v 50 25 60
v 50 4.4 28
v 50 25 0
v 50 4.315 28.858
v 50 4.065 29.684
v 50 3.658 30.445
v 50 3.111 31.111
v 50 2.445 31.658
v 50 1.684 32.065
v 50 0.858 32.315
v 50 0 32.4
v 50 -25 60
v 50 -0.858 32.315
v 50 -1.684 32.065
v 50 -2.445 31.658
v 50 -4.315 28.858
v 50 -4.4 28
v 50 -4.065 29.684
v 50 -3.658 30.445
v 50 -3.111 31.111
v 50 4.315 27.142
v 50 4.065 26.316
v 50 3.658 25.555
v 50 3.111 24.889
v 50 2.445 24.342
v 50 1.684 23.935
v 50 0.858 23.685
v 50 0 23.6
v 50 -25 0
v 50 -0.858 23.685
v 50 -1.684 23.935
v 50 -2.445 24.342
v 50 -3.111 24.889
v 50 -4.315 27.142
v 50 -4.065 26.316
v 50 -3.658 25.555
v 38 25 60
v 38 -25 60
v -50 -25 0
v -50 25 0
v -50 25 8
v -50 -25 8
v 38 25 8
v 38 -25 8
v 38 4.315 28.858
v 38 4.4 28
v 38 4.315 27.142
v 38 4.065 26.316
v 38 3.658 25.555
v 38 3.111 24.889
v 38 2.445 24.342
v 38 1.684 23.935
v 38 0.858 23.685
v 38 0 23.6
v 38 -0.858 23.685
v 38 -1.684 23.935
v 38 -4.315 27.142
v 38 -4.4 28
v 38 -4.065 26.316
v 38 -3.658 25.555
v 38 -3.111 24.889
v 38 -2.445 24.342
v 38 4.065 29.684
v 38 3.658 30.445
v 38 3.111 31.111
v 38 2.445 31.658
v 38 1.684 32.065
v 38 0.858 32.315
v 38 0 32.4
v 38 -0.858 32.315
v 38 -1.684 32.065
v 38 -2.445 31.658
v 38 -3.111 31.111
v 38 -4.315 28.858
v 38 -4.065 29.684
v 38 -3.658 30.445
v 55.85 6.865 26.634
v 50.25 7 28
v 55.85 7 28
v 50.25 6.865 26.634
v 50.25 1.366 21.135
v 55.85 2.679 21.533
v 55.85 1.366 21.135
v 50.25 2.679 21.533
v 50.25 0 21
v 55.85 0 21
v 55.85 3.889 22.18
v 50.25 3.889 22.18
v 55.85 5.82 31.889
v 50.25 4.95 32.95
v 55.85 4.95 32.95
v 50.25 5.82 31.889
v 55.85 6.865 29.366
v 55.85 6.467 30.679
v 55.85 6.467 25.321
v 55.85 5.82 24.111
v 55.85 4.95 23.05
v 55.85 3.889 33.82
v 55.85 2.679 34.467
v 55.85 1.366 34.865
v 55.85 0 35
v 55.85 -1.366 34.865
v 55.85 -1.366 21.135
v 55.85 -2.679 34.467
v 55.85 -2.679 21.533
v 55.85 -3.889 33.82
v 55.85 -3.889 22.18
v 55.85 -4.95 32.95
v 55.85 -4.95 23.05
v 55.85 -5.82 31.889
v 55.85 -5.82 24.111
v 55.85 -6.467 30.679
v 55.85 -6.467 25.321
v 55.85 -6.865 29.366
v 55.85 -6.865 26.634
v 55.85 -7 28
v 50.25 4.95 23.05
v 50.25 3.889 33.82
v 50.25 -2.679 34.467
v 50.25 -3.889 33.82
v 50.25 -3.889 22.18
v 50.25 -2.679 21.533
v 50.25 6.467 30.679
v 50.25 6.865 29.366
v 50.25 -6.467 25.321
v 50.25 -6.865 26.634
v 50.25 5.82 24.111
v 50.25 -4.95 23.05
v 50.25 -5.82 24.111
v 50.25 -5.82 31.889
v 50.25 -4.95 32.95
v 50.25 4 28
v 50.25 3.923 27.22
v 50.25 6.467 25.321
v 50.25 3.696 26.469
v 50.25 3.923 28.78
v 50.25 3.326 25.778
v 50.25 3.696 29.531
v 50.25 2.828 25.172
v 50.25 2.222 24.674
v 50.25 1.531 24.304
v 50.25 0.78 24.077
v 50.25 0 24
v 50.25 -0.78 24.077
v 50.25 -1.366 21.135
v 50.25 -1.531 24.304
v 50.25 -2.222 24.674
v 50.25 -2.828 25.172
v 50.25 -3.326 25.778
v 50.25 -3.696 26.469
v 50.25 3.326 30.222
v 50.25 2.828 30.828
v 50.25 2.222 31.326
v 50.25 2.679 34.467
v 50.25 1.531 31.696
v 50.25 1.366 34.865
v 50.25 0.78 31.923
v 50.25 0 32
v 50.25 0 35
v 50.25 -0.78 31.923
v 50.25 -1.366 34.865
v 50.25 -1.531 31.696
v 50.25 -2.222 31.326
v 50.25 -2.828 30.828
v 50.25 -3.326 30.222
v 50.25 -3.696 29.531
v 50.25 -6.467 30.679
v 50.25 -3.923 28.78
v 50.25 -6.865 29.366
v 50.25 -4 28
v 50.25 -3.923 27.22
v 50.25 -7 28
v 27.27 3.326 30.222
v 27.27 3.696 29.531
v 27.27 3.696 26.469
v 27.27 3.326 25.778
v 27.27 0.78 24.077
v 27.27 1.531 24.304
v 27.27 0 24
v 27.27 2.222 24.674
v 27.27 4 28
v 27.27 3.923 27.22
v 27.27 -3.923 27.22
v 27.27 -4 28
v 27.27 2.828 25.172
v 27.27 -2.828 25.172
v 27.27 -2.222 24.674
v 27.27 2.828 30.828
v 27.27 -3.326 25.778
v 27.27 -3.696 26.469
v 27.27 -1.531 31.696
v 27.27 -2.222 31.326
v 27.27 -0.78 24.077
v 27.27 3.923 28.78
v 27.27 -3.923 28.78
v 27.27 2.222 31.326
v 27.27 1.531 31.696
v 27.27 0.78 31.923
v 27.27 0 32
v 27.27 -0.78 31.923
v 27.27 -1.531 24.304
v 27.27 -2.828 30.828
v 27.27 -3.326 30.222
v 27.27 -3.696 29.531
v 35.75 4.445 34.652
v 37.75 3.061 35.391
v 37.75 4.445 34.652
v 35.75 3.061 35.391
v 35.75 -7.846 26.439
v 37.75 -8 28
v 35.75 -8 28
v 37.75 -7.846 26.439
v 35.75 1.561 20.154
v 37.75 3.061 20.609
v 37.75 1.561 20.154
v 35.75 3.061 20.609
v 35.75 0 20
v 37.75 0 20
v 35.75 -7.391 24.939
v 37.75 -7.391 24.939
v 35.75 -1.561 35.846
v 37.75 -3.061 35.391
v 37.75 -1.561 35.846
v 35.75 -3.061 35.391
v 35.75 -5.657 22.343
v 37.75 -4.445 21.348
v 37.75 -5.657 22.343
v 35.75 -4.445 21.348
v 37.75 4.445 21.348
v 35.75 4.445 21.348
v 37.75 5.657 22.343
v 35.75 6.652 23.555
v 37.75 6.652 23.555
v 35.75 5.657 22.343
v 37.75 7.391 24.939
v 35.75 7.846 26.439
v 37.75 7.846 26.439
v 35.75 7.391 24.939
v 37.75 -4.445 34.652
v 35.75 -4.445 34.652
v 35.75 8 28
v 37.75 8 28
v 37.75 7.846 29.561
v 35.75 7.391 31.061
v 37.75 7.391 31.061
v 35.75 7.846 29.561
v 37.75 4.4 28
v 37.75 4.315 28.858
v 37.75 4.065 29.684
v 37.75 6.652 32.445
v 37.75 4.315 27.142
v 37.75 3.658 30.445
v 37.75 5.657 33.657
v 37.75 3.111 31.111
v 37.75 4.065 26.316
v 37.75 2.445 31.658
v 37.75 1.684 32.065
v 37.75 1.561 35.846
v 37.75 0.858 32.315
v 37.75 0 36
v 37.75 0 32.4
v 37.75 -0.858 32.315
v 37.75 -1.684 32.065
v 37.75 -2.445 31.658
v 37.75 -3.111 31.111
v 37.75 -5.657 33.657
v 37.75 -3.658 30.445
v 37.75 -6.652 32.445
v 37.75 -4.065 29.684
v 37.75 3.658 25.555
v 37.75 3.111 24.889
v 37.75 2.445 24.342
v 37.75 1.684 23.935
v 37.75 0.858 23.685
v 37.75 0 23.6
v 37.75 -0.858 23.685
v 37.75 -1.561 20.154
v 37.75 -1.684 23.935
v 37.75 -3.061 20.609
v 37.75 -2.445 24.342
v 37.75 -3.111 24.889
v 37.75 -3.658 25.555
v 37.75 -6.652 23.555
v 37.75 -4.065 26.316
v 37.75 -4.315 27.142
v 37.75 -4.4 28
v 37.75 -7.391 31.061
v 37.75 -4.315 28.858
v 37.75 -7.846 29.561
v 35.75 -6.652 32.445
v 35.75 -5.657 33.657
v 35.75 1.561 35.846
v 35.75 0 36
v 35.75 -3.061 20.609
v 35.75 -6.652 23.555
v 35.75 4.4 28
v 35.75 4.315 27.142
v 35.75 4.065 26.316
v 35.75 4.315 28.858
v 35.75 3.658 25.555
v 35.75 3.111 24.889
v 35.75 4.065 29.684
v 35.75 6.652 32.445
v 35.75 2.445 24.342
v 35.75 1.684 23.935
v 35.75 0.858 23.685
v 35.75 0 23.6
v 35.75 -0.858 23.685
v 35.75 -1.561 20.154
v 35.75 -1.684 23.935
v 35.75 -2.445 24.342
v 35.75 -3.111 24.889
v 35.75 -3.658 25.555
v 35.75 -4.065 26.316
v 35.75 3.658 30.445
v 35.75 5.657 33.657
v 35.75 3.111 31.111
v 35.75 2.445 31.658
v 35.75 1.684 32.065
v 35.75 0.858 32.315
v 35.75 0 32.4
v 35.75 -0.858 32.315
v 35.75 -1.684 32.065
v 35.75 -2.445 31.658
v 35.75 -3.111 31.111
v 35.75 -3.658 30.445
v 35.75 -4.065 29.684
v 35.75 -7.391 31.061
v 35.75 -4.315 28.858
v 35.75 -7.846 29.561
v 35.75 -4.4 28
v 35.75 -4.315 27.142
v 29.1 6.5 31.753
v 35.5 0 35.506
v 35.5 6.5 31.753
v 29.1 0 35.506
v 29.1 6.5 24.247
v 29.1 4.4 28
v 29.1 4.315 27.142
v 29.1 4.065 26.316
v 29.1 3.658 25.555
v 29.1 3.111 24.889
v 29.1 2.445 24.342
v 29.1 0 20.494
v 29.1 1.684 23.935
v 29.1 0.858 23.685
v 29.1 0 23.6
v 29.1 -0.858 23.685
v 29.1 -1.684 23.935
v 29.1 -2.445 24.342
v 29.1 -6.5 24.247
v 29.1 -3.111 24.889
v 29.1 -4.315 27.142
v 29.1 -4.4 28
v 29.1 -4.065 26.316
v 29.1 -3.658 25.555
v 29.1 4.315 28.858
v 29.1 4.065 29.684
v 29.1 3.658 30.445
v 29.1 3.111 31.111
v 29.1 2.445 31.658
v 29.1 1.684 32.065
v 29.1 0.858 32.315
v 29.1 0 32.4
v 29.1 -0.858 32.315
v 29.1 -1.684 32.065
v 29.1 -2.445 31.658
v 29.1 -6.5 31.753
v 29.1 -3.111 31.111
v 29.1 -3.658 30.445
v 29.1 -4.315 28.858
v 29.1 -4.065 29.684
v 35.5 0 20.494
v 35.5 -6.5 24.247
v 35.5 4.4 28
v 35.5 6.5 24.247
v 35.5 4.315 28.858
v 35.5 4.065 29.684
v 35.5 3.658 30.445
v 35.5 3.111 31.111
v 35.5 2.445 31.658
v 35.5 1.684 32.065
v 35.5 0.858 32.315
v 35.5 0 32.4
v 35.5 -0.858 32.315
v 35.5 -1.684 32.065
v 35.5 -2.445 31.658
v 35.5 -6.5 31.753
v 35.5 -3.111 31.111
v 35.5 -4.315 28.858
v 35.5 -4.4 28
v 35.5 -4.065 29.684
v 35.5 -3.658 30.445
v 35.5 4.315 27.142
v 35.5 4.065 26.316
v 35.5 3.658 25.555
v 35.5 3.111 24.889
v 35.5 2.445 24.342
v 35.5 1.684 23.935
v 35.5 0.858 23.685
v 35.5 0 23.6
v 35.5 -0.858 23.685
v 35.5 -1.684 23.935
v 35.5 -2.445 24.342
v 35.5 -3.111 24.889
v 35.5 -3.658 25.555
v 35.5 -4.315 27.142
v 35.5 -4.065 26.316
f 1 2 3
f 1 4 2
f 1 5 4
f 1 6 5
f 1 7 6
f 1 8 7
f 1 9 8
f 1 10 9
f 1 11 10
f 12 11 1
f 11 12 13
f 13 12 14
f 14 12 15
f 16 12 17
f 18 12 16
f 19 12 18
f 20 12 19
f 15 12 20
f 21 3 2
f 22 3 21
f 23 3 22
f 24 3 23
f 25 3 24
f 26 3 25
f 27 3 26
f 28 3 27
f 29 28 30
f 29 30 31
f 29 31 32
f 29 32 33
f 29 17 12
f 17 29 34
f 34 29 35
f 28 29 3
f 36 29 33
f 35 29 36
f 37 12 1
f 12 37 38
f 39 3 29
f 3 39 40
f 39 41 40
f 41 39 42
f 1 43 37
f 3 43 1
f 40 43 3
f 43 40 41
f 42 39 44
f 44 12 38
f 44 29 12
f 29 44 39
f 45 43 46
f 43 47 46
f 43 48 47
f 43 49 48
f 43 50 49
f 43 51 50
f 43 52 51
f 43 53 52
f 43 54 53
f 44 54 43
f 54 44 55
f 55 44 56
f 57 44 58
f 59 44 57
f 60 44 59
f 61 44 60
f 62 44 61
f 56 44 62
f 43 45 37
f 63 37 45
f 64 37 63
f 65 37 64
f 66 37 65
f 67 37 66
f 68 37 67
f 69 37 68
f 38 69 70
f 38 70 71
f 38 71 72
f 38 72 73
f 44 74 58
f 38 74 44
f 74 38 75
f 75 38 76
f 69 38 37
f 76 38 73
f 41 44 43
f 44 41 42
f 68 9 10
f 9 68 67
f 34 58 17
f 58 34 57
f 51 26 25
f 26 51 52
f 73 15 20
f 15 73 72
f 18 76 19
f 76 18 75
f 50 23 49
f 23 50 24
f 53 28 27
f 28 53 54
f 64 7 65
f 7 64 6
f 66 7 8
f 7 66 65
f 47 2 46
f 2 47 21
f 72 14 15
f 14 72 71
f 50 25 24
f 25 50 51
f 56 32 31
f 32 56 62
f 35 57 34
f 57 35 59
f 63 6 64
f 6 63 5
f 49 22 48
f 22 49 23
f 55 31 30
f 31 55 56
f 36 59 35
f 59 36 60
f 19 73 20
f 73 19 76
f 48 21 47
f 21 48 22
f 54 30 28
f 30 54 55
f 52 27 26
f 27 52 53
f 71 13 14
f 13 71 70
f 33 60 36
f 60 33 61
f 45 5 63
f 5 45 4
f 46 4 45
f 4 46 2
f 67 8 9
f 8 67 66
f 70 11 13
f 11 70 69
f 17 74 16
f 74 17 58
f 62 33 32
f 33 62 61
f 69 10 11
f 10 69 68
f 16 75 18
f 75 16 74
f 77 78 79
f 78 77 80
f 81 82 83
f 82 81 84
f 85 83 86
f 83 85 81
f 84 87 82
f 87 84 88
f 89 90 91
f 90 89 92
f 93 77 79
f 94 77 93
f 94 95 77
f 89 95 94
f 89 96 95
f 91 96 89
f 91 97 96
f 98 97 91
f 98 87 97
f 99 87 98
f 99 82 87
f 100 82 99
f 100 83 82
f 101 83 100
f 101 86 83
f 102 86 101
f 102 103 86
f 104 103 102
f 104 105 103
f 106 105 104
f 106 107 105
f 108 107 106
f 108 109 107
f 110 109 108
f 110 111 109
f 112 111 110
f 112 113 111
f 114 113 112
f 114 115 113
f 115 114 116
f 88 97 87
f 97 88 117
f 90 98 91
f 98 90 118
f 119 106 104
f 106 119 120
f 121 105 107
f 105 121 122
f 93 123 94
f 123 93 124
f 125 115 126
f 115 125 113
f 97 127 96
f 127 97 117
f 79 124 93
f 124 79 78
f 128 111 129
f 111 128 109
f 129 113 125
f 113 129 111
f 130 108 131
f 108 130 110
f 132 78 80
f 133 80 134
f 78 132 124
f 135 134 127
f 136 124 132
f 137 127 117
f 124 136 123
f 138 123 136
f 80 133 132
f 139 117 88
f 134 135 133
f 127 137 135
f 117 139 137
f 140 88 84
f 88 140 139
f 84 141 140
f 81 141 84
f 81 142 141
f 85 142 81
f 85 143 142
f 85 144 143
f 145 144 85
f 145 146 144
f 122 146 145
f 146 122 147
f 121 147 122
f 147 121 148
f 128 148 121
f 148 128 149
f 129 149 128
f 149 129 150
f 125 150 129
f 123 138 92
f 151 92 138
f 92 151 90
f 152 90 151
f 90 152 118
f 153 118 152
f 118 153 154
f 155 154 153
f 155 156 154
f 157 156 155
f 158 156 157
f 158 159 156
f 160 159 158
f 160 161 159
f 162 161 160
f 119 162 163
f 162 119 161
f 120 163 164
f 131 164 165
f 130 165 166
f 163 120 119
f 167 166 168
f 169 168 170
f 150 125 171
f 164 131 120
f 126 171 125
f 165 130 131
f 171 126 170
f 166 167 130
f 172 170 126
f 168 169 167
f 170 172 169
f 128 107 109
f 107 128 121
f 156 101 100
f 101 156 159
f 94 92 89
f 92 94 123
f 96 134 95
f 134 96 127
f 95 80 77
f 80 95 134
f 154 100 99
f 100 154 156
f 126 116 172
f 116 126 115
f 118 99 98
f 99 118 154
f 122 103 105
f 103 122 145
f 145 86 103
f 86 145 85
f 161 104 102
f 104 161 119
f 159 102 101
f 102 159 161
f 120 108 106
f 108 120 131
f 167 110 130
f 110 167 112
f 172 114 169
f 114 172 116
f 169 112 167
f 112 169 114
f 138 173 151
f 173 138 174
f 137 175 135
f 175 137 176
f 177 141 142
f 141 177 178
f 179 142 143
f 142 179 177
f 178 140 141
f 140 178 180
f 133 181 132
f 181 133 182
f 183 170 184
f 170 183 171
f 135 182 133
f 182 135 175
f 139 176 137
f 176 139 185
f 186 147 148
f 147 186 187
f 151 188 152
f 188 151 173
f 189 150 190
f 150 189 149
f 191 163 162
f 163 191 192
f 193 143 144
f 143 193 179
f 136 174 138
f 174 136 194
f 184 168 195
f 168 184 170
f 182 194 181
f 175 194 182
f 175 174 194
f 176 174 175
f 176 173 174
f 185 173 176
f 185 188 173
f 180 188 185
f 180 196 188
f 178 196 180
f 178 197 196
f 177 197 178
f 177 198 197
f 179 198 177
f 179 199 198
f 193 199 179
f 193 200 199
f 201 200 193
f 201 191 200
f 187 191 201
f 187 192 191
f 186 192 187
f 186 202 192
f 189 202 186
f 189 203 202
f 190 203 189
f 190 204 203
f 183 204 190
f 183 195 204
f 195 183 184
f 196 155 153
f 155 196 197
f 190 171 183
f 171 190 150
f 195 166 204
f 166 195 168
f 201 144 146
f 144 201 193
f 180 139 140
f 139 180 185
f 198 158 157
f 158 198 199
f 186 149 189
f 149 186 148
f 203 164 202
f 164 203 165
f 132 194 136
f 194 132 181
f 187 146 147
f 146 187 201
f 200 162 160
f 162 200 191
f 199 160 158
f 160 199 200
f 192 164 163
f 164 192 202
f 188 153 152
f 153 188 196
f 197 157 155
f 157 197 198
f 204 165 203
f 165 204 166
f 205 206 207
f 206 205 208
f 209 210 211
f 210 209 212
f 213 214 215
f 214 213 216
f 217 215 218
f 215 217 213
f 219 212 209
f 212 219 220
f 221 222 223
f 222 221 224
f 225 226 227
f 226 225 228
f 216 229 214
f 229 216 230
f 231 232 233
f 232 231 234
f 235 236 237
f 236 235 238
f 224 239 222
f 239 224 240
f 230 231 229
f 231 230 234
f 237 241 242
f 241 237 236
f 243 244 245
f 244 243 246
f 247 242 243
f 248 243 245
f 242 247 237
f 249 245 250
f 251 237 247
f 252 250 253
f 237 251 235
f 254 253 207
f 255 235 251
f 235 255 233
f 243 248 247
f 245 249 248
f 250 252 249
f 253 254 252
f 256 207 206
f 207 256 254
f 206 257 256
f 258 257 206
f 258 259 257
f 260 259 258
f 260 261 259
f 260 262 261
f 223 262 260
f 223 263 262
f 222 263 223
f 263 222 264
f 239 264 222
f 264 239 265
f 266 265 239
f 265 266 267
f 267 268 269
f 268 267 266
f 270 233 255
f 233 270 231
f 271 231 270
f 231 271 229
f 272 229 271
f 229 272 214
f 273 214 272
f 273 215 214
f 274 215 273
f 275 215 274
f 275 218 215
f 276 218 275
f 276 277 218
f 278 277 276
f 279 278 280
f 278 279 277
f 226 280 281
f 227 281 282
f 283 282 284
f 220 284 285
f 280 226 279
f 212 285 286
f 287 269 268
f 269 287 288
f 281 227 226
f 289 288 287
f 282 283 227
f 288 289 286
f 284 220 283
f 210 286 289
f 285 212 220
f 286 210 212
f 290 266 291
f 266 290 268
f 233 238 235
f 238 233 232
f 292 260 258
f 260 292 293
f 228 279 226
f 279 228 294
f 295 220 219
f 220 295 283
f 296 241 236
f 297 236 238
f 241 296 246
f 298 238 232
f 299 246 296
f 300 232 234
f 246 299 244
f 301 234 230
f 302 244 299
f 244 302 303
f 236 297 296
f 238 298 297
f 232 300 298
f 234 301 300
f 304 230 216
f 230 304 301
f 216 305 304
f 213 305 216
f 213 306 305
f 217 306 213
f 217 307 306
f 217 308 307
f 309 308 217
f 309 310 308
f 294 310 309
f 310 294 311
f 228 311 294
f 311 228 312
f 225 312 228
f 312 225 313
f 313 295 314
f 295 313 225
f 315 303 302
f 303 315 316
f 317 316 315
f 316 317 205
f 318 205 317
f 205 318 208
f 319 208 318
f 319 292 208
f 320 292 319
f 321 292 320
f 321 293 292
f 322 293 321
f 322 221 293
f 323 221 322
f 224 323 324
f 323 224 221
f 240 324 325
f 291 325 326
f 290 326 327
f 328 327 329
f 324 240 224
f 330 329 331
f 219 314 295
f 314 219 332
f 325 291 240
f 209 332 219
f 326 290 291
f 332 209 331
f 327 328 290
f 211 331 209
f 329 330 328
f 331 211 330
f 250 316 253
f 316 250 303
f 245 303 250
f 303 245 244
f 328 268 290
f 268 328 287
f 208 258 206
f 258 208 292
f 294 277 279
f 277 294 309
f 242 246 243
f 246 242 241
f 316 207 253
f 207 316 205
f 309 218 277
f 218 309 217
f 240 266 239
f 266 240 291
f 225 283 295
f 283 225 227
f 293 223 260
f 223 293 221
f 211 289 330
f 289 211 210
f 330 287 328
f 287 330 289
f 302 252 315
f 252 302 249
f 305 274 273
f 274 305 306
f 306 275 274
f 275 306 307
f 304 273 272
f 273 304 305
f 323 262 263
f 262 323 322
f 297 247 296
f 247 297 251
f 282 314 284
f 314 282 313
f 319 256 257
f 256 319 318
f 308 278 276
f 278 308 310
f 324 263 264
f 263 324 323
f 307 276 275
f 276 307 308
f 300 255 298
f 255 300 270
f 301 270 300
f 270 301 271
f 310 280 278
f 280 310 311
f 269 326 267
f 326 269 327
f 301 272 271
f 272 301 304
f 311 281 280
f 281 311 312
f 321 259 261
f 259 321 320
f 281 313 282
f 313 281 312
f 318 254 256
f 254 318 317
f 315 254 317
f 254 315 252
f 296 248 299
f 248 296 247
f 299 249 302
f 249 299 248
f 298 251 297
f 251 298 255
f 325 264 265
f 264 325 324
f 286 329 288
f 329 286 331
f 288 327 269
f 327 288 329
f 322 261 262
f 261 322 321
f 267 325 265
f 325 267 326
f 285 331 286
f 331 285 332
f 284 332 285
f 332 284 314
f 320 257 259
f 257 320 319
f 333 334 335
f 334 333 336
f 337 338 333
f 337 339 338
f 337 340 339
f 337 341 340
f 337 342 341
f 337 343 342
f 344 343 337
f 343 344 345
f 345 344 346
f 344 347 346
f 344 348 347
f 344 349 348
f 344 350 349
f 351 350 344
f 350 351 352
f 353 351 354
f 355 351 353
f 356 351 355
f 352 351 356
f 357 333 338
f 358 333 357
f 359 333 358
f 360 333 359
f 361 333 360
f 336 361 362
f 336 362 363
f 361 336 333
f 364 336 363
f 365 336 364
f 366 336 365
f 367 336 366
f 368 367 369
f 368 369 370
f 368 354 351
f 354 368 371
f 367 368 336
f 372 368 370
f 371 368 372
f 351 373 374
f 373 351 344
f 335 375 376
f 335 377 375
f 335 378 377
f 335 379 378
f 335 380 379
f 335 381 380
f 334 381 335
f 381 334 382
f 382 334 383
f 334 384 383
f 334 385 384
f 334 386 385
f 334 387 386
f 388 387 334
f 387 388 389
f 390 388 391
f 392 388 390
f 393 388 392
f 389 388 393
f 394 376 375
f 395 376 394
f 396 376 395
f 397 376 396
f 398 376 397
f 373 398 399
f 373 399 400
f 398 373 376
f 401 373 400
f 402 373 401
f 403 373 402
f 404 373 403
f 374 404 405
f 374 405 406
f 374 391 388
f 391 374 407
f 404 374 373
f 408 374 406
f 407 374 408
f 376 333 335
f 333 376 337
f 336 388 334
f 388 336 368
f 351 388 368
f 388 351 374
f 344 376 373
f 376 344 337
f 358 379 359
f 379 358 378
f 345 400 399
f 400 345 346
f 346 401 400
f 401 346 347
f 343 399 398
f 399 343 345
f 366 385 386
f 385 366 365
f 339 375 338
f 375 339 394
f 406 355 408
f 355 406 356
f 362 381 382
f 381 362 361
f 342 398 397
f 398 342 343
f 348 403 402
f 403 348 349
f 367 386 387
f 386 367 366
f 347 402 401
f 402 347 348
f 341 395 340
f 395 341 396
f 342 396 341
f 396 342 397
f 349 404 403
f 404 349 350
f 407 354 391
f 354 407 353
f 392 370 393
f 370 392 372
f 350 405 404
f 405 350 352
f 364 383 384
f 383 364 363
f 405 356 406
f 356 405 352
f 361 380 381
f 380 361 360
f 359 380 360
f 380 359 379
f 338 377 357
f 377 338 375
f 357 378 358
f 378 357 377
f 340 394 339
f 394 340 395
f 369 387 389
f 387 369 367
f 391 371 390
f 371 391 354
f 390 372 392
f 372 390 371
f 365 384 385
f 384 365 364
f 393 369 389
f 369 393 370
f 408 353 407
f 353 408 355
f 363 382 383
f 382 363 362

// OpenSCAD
$fn = 32;

// ------------------------------------------------------------------------
// Bolted bracket: 100 x 50 mm bracket with 1 bolt joints
// Every part is its own module, assembly() places them once.
// ------------------------------------------------------------------------

// --- part 1 ---
module bracket() {
  difference() {
    translate([-50, -25, 0]) cube([100, 50, 60]);
    translate([-51, -26, 8]) cube([89, 52, 53]);
    translate([44, 0, 28]) rotate([0, 90, 0]) cylinder(h = 14, d = 8.8, center = true);
  }
}

// --- part 2 ---
module bolt() {
  cylinder(h = 5.6, d = 14);
  translate([0, 0, -22.98]) cylinder(h = 22.98, d = 8);
}

// --- part 3 ---
module washer() {
  difference() {
      translate([0, 0, 0]) cylinder(h = 2, d = 16);
      translate([0, 0, -1]) cylinder(h = 4, d = 8.8);
    }
}

// --- part 4 ---
module nut() {
  difference() {
    linear_extrude(height = 6.4) polygon(points = [[7.506, 0], [3.753, 6.5], [-3.753, 6.5], [-7.506, 0], [-3.753, -6.5], [3.753, -6.5]]);
    translate([0, 0, -1]) cylinder(h = 8.4, d = 8.8);
  }
}

// --- assembly ---
module assembly() {
  translate([0, 0, 0]) rotate([0, 0, 0]) bracket();
  translate([50.25, 0, 28]) rotate([0, 90, 0]) bolt();
  translate([35.75, 0, 28]) rotate([0, 90, 0]) washer();
  translate([29.1, 0, 28]) rotate([0, 90, 0]) nut();
}

assembly();
